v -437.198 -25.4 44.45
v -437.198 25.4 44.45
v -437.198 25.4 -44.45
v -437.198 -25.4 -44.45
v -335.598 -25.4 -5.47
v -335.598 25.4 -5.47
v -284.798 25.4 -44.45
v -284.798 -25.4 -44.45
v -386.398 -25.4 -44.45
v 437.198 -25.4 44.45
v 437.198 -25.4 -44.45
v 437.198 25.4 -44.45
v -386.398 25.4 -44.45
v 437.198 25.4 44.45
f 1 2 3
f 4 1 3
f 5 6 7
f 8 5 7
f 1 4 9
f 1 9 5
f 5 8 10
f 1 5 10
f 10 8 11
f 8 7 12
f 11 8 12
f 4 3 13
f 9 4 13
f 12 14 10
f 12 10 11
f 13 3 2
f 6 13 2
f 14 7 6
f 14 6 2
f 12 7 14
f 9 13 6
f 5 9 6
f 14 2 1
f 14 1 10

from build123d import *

# Parameters (mm, degrees)
SKETCH1_W           = 874.395
SKETCH1_H           = 88.9
BOSS_EXTRUDE1_DEPTH = 25.4
CUT_EXTRUDE1_DEPTH  = 51.8


with BuildPart() as part:
    # Sketch1 → Boss-Extrude1 (new body, symmetric)
    with BuildSketch(Plane(origin=(0, 0, 0), x_dir=(1, 0, 0), z_dir=(0, 1, 0))):
        Rectangle(SKETCH1_W, SKETCH1_H)
    extrude(amount=BOSS_EXTRUDE1_DEPTH, both=True)

    # Sketch2 → Cut-Extrude1 (cut, through all)
    with BuildSketch(Plane(origin=(0, 25.4, 0), x_dir=(1, 0, 0), z_dir=(0, 1, 0))):
        Polygon((-386.3975, 44.45), (-335.5975, 5.469789011), (-284.7975, 44.45), align=None)
    extrude(amount=-CUT_EXTRUDE1_DEPTH, mode=Mode.SUBTRACT)


solid = part.part
